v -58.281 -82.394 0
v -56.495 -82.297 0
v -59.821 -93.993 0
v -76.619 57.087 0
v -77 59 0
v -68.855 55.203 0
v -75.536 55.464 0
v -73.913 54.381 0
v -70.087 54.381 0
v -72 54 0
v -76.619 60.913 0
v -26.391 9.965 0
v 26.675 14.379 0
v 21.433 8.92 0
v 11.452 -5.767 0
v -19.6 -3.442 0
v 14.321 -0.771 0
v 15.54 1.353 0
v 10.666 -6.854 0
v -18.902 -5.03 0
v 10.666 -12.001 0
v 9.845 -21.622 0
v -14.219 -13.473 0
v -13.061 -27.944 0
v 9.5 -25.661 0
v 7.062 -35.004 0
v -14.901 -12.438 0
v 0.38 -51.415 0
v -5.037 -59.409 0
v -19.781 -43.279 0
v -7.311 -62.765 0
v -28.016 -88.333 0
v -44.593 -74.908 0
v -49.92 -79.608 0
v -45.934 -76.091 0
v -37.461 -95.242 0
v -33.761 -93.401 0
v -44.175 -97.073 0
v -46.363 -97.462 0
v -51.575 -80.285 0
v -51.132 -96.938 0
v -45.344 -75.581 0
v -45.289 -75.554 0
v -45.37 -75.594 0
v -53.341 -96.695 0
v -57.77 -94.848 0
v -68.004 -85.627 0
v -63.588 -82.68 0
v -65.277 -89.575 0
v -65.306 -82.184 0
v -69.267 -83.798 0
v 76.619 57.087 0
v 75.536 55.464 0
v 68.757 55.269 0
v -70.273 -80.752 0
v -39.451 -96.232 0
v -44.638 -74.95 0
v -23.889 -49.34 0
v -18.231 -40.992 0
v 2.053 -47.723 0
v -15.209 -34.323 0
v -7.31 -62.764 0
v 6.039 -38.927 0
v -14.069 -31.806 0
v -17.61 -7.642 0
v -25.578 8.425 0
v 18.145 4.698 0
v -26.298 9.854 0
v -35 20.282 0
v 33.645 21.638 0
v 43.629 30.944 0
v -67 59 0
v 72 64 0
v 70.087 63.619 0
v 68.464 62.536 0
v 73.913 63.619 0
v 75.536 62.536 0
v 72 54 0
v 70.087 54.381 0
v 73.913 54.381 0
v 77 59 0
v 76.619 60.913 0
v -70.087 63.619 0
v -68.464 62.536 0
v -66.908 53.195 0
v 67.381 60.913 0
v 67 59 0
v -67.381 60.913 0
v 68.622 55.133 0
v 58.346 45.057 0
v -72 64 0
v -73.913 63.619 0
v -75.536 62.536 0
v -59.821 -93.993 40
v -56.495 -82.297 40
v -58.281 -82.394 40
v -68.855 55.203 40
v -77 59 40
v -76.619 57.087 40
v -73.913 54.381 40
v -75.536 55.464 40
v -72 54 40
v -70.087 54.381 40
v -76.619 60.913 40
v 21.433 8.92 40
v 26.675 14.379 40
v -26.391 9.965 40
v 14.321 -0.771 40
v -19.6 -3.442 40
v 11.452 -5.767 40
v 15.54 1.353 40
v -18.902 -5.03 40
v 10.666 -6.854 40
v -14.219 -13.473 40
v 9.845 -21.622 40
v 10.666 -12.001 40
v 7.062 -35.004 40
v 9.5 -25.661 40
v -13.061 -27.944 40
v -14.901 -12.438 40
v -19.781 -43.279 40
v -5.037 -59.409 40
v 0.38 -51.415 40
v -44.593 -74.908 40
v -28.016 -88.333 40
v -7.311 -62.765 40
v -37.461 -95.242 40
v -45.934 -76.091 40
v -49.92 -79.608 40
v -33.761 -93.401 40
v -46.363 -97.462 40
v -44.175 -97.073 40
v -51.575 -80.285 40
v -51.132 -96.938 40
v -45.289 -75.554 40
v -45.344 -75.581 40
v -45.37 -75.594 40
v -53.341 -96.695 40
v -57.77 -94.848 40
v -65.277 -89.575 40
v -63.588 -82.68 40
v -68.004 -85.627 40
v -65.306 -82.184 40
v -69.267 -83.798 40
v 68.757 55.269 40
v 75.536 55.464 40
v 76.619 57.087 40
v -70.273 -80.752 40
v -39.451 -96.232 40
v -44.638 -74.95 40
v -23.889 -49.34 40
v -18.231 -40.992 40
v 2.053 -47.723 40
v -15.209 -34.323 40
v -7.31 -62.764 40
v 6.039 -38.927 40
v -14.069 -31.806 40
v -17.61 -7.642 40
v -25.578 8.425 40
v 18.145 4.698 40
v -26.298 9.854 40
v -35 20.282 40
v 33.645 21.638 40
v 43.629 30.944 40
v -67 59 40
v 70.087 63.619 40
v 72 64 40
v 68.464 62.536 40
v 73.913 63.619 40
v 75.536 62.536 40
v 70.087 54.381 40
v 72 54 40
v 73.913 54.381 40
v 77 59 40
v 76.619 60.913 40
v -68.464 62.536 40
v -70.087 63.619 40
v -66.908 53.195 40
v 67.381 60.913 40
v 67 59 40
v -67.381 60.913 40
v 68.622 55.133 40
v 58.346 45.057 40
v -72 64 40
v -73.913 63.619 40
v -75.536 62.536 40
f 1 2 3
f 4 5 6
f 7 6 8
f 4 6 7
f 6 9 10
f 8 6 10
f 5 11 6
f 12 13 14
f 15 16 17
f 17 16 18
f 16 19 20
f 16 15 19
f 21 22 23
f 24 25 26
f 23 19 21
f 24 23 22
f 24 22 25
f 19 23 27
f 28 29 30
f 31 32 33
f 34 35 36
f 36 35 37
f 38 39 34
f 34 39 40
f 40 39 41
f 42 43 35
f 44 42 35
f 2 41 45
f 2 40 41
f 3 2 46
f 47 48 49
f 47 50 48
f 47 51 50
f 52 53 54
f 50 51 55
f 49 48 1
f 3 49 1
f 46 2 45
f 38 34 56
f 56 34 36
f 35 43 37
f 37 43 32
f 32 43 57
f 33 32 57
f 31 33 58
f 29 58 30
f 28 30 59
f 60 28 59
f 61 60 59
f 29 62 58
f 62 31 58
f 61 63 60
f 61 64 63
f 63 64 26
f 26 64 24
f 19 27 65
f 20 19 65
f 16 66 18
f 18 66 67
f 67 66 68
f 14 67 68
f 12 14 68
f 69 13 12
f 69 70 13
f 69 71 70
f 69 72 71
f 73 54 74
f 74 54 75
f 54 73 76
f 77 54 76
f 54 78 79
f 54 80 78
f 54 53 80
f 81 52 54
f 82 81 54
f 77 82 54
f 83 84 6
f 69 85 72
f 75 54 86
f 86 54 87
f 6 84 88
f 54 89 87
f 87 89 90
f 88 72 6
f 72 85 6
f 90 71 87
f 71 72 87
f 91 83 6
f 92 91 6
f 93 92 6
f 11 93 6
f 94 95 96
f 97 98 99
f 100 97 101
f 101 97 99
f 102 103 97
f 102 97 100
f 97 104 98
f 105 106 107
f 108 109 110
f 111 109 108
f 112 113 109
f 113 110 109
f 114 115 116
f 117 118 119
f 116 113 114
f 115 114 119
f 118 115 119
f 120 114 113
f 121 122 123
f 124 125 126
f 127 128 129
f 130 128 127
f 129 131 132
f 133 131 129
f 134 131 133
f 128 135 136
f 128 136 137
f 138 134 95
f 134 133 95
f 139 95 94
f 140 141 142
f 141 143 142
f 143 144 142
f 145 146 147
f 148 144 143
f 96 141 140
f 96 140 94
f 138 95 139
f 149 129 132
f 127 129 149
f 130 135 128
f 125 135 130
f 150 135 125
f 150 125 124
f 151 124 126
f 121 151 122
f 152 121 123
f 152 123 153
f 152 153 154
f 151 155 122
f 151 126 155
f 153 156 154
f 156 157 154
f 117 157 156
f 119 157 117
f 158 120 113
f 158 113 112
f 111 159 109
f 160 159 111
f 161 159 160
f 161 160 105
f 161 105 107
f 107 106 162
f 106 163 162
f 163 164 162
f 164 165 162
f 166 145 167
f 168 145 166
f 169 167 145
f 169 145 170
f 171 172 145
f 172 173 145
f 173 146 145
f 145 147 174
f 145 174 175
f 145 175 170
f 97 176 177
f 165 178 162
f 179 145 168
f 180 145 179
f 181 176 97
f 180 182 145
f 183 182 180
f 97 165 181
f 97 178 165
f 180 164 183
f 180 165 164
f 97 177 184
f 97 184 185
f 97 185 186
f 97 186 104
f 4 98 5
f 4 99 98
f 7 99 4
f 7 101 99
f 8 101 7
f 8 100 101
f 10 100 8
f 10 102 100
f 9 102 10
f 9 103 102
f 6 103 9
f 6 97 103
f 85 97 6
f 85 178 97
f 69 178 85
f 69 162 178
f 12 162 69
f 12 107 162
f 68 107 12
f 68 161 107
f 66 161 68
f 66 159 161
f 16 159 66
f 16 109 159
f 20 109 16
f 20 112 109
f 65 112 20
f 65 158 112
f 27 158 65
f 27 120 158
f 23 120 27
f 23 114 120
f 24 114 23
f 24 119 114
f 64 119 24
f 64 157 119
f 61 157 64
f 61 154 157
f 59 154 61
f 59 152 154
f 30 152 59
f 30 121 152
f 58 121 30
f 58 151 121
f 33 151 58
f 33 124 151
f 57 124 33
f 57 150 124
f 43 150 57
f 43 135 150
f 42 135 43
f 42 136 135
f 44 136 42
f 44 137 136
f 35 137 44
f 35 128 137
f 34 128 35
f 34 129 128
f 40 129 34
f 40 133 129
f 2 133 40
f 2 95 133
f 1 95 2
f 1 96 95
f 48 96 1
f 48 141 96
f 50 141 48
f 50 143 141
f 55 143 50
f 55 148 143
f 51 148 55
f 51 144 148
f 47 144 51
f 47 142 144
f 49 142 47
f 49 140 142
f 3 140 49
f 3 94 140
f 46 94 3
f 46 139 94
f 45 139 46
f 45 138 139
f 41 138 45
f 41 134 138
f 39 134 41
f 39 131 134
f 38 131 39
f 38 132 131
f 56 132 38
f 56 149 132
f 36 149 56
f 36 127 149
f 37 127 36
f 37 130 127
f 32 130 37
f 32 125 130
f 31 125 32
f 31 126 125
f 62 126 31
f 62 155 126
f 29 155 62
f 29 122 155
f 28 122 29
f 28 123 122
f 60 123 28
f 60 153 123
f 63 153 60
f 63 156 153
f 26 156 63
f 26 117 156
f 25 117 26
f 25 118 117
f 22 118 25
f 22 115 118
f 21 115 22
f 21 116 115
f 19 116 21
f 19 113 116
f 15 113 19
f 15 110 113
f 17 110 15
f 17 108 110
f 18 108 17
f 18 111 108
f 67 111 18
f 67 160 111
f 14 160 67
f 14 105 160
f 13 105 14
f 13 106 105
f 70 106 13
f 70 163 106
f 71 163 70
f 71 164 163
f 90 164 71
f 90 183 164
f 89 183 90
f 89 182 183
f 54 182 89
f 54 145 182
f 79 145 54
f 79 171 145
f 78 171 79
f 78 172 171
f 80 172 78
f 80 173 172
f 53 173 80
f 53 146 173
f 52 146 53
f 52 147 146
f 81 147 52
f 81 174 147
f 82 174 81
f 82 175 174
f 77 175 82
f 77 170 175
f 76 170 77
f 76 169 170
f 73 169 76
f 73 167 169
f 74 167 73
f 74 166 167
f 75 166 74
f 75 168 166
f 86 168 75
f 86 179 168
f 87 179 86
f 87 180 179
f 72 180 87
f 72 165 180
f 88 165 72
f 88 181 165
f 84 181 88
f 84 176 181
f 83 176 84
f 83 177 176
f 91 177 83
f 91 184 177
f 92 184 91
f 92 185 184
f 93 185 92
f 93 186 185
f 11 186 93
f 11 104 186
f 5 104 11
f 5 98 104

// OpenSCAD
// file: finger.scad
// A long enough distance in every direction from the origin.
universe = 170;

function finger_length() = 36;

finger_width = 12.15;
teeth_pairs = 6;
finger_floor = 2.35;

xy_slack = 0.1;
z_slack = 0.6;

module finger_profile_2d(complement, additional_end_chop=0) {
  if (complement) {
    rotate([0, 0, 180])
    difference() {
      hull() finger_profile_2d(false, additional_end_chop);
      finger_profile_2d(false, additional_end_chop);
    }
  } else {
    for (a = [-1, 1])
    scale([a, 1]) {
      for (b = [0:teeth_pairs-1])
      translate([b*finger_width, 0])
      difference() {      
        polygon([
          [0, -finger_length()/2],
          [finger_width, -finger_length()/2],
          // Apex.
          [
            finger_width/2 + (finger_width/5)*(b+1)/teeth_pairs,
            finger_length()/2
          ],
        ]);
      }
      
      // Shorten the outer tooth, so it fits within the taper of the
      // bottom piece.
      chop_length = additional_end_chop + 5.4; // TUNED
      
      translate([(teeth_pairs-1)*finger_width, -finger_length()/2])
      difference() {
        translate([-5, 0])
        square([10, chop_length*2]);
        
        translate([0, 30/sqrt(2)+chop_length])
        rotate([0, 0, 45])
        square(30, center=true);
      }
    }
  }
}

module finger_base_2d() {
  translate([-universe, -universe-finger_length()/2])
  square([2*universe, universe + 0.001]);
}

module finger_2d(complement) {
  difference() {
    offset(delta=-xy_slack)
    union() {
      // Withdraw the chopped teeth slightly, so they have plenty of room.
      finger_profile_2d(complement, additional_end_chop=0.4);
      finger_base_2d();
    }
    finger_base_2d();
  }
}

module finger_cavity_2d(complement) {
  offset(delta=xy_slack)
  finger_profile_2d(complement);
}

module extrude_fingers(thickness, cavity, complement, rot=false) {
  difference() {
    translate([0, 0, finger_floor + (cavity ? 0 : z_slack)])
    rotate([0, 0, rot ? 180 : 0])
    linear_extrude(
      thickness
      - 2*finger_floor
      - (cavity ? 0 : 2*z_slack)
    ) {    
      if (cavity) {
        finger_cavity_2d(complement);
      } else {
        intersection() {
          finger_2d(complement);
          
          // Truncate the tips of the teeth, and prevent the backs from
          // sticking out.
          translate([-200, -1])
          square([400, 1 + finger_length()/2 - 3.2]);
        }
      }
    }
  }
}

module finger_test(separation=0) {
  width = 145;
  thickness = 15;
  depth = 21;

  // "bottom"
  translate([0, -separation]) {
    difference() {
      translate([-width/2, -depth])
      cube([width, depth, thickness]);
      
      rotate([45, 0, 0])
      cube([250, 0.49, 0.49], center=true);

      extrude_fingers(thickness=thickness, cavity=true, complement=true, rot=true);
    }
    extrude_fingers(thickness=thickness, cavity=false, complement=false);
  }
  
  // "top"
  translate([0, separation]) {
    difference() {
      translate([-width/2, 0])
      cube([width, depth, thickness]);

      rotate([45, 0, 0])
      cube([250, 0.49, 0.49], center=true);

      extrude_fingers(thickness=thickness, cavity=true);
    }
    extrude_fingers(thickness=thickness, cavity=false, complement=true, rot=true);
  }
}

finger_test(10);
// main file
use <paddle.scad>

// Prevent support from being generated inside the knurl grooves.

linear_extrude(40)
projection(cut=true)
translate([0, 0, -0.4])
bottom($opt_knurl = false, $opt_fingers = false);
